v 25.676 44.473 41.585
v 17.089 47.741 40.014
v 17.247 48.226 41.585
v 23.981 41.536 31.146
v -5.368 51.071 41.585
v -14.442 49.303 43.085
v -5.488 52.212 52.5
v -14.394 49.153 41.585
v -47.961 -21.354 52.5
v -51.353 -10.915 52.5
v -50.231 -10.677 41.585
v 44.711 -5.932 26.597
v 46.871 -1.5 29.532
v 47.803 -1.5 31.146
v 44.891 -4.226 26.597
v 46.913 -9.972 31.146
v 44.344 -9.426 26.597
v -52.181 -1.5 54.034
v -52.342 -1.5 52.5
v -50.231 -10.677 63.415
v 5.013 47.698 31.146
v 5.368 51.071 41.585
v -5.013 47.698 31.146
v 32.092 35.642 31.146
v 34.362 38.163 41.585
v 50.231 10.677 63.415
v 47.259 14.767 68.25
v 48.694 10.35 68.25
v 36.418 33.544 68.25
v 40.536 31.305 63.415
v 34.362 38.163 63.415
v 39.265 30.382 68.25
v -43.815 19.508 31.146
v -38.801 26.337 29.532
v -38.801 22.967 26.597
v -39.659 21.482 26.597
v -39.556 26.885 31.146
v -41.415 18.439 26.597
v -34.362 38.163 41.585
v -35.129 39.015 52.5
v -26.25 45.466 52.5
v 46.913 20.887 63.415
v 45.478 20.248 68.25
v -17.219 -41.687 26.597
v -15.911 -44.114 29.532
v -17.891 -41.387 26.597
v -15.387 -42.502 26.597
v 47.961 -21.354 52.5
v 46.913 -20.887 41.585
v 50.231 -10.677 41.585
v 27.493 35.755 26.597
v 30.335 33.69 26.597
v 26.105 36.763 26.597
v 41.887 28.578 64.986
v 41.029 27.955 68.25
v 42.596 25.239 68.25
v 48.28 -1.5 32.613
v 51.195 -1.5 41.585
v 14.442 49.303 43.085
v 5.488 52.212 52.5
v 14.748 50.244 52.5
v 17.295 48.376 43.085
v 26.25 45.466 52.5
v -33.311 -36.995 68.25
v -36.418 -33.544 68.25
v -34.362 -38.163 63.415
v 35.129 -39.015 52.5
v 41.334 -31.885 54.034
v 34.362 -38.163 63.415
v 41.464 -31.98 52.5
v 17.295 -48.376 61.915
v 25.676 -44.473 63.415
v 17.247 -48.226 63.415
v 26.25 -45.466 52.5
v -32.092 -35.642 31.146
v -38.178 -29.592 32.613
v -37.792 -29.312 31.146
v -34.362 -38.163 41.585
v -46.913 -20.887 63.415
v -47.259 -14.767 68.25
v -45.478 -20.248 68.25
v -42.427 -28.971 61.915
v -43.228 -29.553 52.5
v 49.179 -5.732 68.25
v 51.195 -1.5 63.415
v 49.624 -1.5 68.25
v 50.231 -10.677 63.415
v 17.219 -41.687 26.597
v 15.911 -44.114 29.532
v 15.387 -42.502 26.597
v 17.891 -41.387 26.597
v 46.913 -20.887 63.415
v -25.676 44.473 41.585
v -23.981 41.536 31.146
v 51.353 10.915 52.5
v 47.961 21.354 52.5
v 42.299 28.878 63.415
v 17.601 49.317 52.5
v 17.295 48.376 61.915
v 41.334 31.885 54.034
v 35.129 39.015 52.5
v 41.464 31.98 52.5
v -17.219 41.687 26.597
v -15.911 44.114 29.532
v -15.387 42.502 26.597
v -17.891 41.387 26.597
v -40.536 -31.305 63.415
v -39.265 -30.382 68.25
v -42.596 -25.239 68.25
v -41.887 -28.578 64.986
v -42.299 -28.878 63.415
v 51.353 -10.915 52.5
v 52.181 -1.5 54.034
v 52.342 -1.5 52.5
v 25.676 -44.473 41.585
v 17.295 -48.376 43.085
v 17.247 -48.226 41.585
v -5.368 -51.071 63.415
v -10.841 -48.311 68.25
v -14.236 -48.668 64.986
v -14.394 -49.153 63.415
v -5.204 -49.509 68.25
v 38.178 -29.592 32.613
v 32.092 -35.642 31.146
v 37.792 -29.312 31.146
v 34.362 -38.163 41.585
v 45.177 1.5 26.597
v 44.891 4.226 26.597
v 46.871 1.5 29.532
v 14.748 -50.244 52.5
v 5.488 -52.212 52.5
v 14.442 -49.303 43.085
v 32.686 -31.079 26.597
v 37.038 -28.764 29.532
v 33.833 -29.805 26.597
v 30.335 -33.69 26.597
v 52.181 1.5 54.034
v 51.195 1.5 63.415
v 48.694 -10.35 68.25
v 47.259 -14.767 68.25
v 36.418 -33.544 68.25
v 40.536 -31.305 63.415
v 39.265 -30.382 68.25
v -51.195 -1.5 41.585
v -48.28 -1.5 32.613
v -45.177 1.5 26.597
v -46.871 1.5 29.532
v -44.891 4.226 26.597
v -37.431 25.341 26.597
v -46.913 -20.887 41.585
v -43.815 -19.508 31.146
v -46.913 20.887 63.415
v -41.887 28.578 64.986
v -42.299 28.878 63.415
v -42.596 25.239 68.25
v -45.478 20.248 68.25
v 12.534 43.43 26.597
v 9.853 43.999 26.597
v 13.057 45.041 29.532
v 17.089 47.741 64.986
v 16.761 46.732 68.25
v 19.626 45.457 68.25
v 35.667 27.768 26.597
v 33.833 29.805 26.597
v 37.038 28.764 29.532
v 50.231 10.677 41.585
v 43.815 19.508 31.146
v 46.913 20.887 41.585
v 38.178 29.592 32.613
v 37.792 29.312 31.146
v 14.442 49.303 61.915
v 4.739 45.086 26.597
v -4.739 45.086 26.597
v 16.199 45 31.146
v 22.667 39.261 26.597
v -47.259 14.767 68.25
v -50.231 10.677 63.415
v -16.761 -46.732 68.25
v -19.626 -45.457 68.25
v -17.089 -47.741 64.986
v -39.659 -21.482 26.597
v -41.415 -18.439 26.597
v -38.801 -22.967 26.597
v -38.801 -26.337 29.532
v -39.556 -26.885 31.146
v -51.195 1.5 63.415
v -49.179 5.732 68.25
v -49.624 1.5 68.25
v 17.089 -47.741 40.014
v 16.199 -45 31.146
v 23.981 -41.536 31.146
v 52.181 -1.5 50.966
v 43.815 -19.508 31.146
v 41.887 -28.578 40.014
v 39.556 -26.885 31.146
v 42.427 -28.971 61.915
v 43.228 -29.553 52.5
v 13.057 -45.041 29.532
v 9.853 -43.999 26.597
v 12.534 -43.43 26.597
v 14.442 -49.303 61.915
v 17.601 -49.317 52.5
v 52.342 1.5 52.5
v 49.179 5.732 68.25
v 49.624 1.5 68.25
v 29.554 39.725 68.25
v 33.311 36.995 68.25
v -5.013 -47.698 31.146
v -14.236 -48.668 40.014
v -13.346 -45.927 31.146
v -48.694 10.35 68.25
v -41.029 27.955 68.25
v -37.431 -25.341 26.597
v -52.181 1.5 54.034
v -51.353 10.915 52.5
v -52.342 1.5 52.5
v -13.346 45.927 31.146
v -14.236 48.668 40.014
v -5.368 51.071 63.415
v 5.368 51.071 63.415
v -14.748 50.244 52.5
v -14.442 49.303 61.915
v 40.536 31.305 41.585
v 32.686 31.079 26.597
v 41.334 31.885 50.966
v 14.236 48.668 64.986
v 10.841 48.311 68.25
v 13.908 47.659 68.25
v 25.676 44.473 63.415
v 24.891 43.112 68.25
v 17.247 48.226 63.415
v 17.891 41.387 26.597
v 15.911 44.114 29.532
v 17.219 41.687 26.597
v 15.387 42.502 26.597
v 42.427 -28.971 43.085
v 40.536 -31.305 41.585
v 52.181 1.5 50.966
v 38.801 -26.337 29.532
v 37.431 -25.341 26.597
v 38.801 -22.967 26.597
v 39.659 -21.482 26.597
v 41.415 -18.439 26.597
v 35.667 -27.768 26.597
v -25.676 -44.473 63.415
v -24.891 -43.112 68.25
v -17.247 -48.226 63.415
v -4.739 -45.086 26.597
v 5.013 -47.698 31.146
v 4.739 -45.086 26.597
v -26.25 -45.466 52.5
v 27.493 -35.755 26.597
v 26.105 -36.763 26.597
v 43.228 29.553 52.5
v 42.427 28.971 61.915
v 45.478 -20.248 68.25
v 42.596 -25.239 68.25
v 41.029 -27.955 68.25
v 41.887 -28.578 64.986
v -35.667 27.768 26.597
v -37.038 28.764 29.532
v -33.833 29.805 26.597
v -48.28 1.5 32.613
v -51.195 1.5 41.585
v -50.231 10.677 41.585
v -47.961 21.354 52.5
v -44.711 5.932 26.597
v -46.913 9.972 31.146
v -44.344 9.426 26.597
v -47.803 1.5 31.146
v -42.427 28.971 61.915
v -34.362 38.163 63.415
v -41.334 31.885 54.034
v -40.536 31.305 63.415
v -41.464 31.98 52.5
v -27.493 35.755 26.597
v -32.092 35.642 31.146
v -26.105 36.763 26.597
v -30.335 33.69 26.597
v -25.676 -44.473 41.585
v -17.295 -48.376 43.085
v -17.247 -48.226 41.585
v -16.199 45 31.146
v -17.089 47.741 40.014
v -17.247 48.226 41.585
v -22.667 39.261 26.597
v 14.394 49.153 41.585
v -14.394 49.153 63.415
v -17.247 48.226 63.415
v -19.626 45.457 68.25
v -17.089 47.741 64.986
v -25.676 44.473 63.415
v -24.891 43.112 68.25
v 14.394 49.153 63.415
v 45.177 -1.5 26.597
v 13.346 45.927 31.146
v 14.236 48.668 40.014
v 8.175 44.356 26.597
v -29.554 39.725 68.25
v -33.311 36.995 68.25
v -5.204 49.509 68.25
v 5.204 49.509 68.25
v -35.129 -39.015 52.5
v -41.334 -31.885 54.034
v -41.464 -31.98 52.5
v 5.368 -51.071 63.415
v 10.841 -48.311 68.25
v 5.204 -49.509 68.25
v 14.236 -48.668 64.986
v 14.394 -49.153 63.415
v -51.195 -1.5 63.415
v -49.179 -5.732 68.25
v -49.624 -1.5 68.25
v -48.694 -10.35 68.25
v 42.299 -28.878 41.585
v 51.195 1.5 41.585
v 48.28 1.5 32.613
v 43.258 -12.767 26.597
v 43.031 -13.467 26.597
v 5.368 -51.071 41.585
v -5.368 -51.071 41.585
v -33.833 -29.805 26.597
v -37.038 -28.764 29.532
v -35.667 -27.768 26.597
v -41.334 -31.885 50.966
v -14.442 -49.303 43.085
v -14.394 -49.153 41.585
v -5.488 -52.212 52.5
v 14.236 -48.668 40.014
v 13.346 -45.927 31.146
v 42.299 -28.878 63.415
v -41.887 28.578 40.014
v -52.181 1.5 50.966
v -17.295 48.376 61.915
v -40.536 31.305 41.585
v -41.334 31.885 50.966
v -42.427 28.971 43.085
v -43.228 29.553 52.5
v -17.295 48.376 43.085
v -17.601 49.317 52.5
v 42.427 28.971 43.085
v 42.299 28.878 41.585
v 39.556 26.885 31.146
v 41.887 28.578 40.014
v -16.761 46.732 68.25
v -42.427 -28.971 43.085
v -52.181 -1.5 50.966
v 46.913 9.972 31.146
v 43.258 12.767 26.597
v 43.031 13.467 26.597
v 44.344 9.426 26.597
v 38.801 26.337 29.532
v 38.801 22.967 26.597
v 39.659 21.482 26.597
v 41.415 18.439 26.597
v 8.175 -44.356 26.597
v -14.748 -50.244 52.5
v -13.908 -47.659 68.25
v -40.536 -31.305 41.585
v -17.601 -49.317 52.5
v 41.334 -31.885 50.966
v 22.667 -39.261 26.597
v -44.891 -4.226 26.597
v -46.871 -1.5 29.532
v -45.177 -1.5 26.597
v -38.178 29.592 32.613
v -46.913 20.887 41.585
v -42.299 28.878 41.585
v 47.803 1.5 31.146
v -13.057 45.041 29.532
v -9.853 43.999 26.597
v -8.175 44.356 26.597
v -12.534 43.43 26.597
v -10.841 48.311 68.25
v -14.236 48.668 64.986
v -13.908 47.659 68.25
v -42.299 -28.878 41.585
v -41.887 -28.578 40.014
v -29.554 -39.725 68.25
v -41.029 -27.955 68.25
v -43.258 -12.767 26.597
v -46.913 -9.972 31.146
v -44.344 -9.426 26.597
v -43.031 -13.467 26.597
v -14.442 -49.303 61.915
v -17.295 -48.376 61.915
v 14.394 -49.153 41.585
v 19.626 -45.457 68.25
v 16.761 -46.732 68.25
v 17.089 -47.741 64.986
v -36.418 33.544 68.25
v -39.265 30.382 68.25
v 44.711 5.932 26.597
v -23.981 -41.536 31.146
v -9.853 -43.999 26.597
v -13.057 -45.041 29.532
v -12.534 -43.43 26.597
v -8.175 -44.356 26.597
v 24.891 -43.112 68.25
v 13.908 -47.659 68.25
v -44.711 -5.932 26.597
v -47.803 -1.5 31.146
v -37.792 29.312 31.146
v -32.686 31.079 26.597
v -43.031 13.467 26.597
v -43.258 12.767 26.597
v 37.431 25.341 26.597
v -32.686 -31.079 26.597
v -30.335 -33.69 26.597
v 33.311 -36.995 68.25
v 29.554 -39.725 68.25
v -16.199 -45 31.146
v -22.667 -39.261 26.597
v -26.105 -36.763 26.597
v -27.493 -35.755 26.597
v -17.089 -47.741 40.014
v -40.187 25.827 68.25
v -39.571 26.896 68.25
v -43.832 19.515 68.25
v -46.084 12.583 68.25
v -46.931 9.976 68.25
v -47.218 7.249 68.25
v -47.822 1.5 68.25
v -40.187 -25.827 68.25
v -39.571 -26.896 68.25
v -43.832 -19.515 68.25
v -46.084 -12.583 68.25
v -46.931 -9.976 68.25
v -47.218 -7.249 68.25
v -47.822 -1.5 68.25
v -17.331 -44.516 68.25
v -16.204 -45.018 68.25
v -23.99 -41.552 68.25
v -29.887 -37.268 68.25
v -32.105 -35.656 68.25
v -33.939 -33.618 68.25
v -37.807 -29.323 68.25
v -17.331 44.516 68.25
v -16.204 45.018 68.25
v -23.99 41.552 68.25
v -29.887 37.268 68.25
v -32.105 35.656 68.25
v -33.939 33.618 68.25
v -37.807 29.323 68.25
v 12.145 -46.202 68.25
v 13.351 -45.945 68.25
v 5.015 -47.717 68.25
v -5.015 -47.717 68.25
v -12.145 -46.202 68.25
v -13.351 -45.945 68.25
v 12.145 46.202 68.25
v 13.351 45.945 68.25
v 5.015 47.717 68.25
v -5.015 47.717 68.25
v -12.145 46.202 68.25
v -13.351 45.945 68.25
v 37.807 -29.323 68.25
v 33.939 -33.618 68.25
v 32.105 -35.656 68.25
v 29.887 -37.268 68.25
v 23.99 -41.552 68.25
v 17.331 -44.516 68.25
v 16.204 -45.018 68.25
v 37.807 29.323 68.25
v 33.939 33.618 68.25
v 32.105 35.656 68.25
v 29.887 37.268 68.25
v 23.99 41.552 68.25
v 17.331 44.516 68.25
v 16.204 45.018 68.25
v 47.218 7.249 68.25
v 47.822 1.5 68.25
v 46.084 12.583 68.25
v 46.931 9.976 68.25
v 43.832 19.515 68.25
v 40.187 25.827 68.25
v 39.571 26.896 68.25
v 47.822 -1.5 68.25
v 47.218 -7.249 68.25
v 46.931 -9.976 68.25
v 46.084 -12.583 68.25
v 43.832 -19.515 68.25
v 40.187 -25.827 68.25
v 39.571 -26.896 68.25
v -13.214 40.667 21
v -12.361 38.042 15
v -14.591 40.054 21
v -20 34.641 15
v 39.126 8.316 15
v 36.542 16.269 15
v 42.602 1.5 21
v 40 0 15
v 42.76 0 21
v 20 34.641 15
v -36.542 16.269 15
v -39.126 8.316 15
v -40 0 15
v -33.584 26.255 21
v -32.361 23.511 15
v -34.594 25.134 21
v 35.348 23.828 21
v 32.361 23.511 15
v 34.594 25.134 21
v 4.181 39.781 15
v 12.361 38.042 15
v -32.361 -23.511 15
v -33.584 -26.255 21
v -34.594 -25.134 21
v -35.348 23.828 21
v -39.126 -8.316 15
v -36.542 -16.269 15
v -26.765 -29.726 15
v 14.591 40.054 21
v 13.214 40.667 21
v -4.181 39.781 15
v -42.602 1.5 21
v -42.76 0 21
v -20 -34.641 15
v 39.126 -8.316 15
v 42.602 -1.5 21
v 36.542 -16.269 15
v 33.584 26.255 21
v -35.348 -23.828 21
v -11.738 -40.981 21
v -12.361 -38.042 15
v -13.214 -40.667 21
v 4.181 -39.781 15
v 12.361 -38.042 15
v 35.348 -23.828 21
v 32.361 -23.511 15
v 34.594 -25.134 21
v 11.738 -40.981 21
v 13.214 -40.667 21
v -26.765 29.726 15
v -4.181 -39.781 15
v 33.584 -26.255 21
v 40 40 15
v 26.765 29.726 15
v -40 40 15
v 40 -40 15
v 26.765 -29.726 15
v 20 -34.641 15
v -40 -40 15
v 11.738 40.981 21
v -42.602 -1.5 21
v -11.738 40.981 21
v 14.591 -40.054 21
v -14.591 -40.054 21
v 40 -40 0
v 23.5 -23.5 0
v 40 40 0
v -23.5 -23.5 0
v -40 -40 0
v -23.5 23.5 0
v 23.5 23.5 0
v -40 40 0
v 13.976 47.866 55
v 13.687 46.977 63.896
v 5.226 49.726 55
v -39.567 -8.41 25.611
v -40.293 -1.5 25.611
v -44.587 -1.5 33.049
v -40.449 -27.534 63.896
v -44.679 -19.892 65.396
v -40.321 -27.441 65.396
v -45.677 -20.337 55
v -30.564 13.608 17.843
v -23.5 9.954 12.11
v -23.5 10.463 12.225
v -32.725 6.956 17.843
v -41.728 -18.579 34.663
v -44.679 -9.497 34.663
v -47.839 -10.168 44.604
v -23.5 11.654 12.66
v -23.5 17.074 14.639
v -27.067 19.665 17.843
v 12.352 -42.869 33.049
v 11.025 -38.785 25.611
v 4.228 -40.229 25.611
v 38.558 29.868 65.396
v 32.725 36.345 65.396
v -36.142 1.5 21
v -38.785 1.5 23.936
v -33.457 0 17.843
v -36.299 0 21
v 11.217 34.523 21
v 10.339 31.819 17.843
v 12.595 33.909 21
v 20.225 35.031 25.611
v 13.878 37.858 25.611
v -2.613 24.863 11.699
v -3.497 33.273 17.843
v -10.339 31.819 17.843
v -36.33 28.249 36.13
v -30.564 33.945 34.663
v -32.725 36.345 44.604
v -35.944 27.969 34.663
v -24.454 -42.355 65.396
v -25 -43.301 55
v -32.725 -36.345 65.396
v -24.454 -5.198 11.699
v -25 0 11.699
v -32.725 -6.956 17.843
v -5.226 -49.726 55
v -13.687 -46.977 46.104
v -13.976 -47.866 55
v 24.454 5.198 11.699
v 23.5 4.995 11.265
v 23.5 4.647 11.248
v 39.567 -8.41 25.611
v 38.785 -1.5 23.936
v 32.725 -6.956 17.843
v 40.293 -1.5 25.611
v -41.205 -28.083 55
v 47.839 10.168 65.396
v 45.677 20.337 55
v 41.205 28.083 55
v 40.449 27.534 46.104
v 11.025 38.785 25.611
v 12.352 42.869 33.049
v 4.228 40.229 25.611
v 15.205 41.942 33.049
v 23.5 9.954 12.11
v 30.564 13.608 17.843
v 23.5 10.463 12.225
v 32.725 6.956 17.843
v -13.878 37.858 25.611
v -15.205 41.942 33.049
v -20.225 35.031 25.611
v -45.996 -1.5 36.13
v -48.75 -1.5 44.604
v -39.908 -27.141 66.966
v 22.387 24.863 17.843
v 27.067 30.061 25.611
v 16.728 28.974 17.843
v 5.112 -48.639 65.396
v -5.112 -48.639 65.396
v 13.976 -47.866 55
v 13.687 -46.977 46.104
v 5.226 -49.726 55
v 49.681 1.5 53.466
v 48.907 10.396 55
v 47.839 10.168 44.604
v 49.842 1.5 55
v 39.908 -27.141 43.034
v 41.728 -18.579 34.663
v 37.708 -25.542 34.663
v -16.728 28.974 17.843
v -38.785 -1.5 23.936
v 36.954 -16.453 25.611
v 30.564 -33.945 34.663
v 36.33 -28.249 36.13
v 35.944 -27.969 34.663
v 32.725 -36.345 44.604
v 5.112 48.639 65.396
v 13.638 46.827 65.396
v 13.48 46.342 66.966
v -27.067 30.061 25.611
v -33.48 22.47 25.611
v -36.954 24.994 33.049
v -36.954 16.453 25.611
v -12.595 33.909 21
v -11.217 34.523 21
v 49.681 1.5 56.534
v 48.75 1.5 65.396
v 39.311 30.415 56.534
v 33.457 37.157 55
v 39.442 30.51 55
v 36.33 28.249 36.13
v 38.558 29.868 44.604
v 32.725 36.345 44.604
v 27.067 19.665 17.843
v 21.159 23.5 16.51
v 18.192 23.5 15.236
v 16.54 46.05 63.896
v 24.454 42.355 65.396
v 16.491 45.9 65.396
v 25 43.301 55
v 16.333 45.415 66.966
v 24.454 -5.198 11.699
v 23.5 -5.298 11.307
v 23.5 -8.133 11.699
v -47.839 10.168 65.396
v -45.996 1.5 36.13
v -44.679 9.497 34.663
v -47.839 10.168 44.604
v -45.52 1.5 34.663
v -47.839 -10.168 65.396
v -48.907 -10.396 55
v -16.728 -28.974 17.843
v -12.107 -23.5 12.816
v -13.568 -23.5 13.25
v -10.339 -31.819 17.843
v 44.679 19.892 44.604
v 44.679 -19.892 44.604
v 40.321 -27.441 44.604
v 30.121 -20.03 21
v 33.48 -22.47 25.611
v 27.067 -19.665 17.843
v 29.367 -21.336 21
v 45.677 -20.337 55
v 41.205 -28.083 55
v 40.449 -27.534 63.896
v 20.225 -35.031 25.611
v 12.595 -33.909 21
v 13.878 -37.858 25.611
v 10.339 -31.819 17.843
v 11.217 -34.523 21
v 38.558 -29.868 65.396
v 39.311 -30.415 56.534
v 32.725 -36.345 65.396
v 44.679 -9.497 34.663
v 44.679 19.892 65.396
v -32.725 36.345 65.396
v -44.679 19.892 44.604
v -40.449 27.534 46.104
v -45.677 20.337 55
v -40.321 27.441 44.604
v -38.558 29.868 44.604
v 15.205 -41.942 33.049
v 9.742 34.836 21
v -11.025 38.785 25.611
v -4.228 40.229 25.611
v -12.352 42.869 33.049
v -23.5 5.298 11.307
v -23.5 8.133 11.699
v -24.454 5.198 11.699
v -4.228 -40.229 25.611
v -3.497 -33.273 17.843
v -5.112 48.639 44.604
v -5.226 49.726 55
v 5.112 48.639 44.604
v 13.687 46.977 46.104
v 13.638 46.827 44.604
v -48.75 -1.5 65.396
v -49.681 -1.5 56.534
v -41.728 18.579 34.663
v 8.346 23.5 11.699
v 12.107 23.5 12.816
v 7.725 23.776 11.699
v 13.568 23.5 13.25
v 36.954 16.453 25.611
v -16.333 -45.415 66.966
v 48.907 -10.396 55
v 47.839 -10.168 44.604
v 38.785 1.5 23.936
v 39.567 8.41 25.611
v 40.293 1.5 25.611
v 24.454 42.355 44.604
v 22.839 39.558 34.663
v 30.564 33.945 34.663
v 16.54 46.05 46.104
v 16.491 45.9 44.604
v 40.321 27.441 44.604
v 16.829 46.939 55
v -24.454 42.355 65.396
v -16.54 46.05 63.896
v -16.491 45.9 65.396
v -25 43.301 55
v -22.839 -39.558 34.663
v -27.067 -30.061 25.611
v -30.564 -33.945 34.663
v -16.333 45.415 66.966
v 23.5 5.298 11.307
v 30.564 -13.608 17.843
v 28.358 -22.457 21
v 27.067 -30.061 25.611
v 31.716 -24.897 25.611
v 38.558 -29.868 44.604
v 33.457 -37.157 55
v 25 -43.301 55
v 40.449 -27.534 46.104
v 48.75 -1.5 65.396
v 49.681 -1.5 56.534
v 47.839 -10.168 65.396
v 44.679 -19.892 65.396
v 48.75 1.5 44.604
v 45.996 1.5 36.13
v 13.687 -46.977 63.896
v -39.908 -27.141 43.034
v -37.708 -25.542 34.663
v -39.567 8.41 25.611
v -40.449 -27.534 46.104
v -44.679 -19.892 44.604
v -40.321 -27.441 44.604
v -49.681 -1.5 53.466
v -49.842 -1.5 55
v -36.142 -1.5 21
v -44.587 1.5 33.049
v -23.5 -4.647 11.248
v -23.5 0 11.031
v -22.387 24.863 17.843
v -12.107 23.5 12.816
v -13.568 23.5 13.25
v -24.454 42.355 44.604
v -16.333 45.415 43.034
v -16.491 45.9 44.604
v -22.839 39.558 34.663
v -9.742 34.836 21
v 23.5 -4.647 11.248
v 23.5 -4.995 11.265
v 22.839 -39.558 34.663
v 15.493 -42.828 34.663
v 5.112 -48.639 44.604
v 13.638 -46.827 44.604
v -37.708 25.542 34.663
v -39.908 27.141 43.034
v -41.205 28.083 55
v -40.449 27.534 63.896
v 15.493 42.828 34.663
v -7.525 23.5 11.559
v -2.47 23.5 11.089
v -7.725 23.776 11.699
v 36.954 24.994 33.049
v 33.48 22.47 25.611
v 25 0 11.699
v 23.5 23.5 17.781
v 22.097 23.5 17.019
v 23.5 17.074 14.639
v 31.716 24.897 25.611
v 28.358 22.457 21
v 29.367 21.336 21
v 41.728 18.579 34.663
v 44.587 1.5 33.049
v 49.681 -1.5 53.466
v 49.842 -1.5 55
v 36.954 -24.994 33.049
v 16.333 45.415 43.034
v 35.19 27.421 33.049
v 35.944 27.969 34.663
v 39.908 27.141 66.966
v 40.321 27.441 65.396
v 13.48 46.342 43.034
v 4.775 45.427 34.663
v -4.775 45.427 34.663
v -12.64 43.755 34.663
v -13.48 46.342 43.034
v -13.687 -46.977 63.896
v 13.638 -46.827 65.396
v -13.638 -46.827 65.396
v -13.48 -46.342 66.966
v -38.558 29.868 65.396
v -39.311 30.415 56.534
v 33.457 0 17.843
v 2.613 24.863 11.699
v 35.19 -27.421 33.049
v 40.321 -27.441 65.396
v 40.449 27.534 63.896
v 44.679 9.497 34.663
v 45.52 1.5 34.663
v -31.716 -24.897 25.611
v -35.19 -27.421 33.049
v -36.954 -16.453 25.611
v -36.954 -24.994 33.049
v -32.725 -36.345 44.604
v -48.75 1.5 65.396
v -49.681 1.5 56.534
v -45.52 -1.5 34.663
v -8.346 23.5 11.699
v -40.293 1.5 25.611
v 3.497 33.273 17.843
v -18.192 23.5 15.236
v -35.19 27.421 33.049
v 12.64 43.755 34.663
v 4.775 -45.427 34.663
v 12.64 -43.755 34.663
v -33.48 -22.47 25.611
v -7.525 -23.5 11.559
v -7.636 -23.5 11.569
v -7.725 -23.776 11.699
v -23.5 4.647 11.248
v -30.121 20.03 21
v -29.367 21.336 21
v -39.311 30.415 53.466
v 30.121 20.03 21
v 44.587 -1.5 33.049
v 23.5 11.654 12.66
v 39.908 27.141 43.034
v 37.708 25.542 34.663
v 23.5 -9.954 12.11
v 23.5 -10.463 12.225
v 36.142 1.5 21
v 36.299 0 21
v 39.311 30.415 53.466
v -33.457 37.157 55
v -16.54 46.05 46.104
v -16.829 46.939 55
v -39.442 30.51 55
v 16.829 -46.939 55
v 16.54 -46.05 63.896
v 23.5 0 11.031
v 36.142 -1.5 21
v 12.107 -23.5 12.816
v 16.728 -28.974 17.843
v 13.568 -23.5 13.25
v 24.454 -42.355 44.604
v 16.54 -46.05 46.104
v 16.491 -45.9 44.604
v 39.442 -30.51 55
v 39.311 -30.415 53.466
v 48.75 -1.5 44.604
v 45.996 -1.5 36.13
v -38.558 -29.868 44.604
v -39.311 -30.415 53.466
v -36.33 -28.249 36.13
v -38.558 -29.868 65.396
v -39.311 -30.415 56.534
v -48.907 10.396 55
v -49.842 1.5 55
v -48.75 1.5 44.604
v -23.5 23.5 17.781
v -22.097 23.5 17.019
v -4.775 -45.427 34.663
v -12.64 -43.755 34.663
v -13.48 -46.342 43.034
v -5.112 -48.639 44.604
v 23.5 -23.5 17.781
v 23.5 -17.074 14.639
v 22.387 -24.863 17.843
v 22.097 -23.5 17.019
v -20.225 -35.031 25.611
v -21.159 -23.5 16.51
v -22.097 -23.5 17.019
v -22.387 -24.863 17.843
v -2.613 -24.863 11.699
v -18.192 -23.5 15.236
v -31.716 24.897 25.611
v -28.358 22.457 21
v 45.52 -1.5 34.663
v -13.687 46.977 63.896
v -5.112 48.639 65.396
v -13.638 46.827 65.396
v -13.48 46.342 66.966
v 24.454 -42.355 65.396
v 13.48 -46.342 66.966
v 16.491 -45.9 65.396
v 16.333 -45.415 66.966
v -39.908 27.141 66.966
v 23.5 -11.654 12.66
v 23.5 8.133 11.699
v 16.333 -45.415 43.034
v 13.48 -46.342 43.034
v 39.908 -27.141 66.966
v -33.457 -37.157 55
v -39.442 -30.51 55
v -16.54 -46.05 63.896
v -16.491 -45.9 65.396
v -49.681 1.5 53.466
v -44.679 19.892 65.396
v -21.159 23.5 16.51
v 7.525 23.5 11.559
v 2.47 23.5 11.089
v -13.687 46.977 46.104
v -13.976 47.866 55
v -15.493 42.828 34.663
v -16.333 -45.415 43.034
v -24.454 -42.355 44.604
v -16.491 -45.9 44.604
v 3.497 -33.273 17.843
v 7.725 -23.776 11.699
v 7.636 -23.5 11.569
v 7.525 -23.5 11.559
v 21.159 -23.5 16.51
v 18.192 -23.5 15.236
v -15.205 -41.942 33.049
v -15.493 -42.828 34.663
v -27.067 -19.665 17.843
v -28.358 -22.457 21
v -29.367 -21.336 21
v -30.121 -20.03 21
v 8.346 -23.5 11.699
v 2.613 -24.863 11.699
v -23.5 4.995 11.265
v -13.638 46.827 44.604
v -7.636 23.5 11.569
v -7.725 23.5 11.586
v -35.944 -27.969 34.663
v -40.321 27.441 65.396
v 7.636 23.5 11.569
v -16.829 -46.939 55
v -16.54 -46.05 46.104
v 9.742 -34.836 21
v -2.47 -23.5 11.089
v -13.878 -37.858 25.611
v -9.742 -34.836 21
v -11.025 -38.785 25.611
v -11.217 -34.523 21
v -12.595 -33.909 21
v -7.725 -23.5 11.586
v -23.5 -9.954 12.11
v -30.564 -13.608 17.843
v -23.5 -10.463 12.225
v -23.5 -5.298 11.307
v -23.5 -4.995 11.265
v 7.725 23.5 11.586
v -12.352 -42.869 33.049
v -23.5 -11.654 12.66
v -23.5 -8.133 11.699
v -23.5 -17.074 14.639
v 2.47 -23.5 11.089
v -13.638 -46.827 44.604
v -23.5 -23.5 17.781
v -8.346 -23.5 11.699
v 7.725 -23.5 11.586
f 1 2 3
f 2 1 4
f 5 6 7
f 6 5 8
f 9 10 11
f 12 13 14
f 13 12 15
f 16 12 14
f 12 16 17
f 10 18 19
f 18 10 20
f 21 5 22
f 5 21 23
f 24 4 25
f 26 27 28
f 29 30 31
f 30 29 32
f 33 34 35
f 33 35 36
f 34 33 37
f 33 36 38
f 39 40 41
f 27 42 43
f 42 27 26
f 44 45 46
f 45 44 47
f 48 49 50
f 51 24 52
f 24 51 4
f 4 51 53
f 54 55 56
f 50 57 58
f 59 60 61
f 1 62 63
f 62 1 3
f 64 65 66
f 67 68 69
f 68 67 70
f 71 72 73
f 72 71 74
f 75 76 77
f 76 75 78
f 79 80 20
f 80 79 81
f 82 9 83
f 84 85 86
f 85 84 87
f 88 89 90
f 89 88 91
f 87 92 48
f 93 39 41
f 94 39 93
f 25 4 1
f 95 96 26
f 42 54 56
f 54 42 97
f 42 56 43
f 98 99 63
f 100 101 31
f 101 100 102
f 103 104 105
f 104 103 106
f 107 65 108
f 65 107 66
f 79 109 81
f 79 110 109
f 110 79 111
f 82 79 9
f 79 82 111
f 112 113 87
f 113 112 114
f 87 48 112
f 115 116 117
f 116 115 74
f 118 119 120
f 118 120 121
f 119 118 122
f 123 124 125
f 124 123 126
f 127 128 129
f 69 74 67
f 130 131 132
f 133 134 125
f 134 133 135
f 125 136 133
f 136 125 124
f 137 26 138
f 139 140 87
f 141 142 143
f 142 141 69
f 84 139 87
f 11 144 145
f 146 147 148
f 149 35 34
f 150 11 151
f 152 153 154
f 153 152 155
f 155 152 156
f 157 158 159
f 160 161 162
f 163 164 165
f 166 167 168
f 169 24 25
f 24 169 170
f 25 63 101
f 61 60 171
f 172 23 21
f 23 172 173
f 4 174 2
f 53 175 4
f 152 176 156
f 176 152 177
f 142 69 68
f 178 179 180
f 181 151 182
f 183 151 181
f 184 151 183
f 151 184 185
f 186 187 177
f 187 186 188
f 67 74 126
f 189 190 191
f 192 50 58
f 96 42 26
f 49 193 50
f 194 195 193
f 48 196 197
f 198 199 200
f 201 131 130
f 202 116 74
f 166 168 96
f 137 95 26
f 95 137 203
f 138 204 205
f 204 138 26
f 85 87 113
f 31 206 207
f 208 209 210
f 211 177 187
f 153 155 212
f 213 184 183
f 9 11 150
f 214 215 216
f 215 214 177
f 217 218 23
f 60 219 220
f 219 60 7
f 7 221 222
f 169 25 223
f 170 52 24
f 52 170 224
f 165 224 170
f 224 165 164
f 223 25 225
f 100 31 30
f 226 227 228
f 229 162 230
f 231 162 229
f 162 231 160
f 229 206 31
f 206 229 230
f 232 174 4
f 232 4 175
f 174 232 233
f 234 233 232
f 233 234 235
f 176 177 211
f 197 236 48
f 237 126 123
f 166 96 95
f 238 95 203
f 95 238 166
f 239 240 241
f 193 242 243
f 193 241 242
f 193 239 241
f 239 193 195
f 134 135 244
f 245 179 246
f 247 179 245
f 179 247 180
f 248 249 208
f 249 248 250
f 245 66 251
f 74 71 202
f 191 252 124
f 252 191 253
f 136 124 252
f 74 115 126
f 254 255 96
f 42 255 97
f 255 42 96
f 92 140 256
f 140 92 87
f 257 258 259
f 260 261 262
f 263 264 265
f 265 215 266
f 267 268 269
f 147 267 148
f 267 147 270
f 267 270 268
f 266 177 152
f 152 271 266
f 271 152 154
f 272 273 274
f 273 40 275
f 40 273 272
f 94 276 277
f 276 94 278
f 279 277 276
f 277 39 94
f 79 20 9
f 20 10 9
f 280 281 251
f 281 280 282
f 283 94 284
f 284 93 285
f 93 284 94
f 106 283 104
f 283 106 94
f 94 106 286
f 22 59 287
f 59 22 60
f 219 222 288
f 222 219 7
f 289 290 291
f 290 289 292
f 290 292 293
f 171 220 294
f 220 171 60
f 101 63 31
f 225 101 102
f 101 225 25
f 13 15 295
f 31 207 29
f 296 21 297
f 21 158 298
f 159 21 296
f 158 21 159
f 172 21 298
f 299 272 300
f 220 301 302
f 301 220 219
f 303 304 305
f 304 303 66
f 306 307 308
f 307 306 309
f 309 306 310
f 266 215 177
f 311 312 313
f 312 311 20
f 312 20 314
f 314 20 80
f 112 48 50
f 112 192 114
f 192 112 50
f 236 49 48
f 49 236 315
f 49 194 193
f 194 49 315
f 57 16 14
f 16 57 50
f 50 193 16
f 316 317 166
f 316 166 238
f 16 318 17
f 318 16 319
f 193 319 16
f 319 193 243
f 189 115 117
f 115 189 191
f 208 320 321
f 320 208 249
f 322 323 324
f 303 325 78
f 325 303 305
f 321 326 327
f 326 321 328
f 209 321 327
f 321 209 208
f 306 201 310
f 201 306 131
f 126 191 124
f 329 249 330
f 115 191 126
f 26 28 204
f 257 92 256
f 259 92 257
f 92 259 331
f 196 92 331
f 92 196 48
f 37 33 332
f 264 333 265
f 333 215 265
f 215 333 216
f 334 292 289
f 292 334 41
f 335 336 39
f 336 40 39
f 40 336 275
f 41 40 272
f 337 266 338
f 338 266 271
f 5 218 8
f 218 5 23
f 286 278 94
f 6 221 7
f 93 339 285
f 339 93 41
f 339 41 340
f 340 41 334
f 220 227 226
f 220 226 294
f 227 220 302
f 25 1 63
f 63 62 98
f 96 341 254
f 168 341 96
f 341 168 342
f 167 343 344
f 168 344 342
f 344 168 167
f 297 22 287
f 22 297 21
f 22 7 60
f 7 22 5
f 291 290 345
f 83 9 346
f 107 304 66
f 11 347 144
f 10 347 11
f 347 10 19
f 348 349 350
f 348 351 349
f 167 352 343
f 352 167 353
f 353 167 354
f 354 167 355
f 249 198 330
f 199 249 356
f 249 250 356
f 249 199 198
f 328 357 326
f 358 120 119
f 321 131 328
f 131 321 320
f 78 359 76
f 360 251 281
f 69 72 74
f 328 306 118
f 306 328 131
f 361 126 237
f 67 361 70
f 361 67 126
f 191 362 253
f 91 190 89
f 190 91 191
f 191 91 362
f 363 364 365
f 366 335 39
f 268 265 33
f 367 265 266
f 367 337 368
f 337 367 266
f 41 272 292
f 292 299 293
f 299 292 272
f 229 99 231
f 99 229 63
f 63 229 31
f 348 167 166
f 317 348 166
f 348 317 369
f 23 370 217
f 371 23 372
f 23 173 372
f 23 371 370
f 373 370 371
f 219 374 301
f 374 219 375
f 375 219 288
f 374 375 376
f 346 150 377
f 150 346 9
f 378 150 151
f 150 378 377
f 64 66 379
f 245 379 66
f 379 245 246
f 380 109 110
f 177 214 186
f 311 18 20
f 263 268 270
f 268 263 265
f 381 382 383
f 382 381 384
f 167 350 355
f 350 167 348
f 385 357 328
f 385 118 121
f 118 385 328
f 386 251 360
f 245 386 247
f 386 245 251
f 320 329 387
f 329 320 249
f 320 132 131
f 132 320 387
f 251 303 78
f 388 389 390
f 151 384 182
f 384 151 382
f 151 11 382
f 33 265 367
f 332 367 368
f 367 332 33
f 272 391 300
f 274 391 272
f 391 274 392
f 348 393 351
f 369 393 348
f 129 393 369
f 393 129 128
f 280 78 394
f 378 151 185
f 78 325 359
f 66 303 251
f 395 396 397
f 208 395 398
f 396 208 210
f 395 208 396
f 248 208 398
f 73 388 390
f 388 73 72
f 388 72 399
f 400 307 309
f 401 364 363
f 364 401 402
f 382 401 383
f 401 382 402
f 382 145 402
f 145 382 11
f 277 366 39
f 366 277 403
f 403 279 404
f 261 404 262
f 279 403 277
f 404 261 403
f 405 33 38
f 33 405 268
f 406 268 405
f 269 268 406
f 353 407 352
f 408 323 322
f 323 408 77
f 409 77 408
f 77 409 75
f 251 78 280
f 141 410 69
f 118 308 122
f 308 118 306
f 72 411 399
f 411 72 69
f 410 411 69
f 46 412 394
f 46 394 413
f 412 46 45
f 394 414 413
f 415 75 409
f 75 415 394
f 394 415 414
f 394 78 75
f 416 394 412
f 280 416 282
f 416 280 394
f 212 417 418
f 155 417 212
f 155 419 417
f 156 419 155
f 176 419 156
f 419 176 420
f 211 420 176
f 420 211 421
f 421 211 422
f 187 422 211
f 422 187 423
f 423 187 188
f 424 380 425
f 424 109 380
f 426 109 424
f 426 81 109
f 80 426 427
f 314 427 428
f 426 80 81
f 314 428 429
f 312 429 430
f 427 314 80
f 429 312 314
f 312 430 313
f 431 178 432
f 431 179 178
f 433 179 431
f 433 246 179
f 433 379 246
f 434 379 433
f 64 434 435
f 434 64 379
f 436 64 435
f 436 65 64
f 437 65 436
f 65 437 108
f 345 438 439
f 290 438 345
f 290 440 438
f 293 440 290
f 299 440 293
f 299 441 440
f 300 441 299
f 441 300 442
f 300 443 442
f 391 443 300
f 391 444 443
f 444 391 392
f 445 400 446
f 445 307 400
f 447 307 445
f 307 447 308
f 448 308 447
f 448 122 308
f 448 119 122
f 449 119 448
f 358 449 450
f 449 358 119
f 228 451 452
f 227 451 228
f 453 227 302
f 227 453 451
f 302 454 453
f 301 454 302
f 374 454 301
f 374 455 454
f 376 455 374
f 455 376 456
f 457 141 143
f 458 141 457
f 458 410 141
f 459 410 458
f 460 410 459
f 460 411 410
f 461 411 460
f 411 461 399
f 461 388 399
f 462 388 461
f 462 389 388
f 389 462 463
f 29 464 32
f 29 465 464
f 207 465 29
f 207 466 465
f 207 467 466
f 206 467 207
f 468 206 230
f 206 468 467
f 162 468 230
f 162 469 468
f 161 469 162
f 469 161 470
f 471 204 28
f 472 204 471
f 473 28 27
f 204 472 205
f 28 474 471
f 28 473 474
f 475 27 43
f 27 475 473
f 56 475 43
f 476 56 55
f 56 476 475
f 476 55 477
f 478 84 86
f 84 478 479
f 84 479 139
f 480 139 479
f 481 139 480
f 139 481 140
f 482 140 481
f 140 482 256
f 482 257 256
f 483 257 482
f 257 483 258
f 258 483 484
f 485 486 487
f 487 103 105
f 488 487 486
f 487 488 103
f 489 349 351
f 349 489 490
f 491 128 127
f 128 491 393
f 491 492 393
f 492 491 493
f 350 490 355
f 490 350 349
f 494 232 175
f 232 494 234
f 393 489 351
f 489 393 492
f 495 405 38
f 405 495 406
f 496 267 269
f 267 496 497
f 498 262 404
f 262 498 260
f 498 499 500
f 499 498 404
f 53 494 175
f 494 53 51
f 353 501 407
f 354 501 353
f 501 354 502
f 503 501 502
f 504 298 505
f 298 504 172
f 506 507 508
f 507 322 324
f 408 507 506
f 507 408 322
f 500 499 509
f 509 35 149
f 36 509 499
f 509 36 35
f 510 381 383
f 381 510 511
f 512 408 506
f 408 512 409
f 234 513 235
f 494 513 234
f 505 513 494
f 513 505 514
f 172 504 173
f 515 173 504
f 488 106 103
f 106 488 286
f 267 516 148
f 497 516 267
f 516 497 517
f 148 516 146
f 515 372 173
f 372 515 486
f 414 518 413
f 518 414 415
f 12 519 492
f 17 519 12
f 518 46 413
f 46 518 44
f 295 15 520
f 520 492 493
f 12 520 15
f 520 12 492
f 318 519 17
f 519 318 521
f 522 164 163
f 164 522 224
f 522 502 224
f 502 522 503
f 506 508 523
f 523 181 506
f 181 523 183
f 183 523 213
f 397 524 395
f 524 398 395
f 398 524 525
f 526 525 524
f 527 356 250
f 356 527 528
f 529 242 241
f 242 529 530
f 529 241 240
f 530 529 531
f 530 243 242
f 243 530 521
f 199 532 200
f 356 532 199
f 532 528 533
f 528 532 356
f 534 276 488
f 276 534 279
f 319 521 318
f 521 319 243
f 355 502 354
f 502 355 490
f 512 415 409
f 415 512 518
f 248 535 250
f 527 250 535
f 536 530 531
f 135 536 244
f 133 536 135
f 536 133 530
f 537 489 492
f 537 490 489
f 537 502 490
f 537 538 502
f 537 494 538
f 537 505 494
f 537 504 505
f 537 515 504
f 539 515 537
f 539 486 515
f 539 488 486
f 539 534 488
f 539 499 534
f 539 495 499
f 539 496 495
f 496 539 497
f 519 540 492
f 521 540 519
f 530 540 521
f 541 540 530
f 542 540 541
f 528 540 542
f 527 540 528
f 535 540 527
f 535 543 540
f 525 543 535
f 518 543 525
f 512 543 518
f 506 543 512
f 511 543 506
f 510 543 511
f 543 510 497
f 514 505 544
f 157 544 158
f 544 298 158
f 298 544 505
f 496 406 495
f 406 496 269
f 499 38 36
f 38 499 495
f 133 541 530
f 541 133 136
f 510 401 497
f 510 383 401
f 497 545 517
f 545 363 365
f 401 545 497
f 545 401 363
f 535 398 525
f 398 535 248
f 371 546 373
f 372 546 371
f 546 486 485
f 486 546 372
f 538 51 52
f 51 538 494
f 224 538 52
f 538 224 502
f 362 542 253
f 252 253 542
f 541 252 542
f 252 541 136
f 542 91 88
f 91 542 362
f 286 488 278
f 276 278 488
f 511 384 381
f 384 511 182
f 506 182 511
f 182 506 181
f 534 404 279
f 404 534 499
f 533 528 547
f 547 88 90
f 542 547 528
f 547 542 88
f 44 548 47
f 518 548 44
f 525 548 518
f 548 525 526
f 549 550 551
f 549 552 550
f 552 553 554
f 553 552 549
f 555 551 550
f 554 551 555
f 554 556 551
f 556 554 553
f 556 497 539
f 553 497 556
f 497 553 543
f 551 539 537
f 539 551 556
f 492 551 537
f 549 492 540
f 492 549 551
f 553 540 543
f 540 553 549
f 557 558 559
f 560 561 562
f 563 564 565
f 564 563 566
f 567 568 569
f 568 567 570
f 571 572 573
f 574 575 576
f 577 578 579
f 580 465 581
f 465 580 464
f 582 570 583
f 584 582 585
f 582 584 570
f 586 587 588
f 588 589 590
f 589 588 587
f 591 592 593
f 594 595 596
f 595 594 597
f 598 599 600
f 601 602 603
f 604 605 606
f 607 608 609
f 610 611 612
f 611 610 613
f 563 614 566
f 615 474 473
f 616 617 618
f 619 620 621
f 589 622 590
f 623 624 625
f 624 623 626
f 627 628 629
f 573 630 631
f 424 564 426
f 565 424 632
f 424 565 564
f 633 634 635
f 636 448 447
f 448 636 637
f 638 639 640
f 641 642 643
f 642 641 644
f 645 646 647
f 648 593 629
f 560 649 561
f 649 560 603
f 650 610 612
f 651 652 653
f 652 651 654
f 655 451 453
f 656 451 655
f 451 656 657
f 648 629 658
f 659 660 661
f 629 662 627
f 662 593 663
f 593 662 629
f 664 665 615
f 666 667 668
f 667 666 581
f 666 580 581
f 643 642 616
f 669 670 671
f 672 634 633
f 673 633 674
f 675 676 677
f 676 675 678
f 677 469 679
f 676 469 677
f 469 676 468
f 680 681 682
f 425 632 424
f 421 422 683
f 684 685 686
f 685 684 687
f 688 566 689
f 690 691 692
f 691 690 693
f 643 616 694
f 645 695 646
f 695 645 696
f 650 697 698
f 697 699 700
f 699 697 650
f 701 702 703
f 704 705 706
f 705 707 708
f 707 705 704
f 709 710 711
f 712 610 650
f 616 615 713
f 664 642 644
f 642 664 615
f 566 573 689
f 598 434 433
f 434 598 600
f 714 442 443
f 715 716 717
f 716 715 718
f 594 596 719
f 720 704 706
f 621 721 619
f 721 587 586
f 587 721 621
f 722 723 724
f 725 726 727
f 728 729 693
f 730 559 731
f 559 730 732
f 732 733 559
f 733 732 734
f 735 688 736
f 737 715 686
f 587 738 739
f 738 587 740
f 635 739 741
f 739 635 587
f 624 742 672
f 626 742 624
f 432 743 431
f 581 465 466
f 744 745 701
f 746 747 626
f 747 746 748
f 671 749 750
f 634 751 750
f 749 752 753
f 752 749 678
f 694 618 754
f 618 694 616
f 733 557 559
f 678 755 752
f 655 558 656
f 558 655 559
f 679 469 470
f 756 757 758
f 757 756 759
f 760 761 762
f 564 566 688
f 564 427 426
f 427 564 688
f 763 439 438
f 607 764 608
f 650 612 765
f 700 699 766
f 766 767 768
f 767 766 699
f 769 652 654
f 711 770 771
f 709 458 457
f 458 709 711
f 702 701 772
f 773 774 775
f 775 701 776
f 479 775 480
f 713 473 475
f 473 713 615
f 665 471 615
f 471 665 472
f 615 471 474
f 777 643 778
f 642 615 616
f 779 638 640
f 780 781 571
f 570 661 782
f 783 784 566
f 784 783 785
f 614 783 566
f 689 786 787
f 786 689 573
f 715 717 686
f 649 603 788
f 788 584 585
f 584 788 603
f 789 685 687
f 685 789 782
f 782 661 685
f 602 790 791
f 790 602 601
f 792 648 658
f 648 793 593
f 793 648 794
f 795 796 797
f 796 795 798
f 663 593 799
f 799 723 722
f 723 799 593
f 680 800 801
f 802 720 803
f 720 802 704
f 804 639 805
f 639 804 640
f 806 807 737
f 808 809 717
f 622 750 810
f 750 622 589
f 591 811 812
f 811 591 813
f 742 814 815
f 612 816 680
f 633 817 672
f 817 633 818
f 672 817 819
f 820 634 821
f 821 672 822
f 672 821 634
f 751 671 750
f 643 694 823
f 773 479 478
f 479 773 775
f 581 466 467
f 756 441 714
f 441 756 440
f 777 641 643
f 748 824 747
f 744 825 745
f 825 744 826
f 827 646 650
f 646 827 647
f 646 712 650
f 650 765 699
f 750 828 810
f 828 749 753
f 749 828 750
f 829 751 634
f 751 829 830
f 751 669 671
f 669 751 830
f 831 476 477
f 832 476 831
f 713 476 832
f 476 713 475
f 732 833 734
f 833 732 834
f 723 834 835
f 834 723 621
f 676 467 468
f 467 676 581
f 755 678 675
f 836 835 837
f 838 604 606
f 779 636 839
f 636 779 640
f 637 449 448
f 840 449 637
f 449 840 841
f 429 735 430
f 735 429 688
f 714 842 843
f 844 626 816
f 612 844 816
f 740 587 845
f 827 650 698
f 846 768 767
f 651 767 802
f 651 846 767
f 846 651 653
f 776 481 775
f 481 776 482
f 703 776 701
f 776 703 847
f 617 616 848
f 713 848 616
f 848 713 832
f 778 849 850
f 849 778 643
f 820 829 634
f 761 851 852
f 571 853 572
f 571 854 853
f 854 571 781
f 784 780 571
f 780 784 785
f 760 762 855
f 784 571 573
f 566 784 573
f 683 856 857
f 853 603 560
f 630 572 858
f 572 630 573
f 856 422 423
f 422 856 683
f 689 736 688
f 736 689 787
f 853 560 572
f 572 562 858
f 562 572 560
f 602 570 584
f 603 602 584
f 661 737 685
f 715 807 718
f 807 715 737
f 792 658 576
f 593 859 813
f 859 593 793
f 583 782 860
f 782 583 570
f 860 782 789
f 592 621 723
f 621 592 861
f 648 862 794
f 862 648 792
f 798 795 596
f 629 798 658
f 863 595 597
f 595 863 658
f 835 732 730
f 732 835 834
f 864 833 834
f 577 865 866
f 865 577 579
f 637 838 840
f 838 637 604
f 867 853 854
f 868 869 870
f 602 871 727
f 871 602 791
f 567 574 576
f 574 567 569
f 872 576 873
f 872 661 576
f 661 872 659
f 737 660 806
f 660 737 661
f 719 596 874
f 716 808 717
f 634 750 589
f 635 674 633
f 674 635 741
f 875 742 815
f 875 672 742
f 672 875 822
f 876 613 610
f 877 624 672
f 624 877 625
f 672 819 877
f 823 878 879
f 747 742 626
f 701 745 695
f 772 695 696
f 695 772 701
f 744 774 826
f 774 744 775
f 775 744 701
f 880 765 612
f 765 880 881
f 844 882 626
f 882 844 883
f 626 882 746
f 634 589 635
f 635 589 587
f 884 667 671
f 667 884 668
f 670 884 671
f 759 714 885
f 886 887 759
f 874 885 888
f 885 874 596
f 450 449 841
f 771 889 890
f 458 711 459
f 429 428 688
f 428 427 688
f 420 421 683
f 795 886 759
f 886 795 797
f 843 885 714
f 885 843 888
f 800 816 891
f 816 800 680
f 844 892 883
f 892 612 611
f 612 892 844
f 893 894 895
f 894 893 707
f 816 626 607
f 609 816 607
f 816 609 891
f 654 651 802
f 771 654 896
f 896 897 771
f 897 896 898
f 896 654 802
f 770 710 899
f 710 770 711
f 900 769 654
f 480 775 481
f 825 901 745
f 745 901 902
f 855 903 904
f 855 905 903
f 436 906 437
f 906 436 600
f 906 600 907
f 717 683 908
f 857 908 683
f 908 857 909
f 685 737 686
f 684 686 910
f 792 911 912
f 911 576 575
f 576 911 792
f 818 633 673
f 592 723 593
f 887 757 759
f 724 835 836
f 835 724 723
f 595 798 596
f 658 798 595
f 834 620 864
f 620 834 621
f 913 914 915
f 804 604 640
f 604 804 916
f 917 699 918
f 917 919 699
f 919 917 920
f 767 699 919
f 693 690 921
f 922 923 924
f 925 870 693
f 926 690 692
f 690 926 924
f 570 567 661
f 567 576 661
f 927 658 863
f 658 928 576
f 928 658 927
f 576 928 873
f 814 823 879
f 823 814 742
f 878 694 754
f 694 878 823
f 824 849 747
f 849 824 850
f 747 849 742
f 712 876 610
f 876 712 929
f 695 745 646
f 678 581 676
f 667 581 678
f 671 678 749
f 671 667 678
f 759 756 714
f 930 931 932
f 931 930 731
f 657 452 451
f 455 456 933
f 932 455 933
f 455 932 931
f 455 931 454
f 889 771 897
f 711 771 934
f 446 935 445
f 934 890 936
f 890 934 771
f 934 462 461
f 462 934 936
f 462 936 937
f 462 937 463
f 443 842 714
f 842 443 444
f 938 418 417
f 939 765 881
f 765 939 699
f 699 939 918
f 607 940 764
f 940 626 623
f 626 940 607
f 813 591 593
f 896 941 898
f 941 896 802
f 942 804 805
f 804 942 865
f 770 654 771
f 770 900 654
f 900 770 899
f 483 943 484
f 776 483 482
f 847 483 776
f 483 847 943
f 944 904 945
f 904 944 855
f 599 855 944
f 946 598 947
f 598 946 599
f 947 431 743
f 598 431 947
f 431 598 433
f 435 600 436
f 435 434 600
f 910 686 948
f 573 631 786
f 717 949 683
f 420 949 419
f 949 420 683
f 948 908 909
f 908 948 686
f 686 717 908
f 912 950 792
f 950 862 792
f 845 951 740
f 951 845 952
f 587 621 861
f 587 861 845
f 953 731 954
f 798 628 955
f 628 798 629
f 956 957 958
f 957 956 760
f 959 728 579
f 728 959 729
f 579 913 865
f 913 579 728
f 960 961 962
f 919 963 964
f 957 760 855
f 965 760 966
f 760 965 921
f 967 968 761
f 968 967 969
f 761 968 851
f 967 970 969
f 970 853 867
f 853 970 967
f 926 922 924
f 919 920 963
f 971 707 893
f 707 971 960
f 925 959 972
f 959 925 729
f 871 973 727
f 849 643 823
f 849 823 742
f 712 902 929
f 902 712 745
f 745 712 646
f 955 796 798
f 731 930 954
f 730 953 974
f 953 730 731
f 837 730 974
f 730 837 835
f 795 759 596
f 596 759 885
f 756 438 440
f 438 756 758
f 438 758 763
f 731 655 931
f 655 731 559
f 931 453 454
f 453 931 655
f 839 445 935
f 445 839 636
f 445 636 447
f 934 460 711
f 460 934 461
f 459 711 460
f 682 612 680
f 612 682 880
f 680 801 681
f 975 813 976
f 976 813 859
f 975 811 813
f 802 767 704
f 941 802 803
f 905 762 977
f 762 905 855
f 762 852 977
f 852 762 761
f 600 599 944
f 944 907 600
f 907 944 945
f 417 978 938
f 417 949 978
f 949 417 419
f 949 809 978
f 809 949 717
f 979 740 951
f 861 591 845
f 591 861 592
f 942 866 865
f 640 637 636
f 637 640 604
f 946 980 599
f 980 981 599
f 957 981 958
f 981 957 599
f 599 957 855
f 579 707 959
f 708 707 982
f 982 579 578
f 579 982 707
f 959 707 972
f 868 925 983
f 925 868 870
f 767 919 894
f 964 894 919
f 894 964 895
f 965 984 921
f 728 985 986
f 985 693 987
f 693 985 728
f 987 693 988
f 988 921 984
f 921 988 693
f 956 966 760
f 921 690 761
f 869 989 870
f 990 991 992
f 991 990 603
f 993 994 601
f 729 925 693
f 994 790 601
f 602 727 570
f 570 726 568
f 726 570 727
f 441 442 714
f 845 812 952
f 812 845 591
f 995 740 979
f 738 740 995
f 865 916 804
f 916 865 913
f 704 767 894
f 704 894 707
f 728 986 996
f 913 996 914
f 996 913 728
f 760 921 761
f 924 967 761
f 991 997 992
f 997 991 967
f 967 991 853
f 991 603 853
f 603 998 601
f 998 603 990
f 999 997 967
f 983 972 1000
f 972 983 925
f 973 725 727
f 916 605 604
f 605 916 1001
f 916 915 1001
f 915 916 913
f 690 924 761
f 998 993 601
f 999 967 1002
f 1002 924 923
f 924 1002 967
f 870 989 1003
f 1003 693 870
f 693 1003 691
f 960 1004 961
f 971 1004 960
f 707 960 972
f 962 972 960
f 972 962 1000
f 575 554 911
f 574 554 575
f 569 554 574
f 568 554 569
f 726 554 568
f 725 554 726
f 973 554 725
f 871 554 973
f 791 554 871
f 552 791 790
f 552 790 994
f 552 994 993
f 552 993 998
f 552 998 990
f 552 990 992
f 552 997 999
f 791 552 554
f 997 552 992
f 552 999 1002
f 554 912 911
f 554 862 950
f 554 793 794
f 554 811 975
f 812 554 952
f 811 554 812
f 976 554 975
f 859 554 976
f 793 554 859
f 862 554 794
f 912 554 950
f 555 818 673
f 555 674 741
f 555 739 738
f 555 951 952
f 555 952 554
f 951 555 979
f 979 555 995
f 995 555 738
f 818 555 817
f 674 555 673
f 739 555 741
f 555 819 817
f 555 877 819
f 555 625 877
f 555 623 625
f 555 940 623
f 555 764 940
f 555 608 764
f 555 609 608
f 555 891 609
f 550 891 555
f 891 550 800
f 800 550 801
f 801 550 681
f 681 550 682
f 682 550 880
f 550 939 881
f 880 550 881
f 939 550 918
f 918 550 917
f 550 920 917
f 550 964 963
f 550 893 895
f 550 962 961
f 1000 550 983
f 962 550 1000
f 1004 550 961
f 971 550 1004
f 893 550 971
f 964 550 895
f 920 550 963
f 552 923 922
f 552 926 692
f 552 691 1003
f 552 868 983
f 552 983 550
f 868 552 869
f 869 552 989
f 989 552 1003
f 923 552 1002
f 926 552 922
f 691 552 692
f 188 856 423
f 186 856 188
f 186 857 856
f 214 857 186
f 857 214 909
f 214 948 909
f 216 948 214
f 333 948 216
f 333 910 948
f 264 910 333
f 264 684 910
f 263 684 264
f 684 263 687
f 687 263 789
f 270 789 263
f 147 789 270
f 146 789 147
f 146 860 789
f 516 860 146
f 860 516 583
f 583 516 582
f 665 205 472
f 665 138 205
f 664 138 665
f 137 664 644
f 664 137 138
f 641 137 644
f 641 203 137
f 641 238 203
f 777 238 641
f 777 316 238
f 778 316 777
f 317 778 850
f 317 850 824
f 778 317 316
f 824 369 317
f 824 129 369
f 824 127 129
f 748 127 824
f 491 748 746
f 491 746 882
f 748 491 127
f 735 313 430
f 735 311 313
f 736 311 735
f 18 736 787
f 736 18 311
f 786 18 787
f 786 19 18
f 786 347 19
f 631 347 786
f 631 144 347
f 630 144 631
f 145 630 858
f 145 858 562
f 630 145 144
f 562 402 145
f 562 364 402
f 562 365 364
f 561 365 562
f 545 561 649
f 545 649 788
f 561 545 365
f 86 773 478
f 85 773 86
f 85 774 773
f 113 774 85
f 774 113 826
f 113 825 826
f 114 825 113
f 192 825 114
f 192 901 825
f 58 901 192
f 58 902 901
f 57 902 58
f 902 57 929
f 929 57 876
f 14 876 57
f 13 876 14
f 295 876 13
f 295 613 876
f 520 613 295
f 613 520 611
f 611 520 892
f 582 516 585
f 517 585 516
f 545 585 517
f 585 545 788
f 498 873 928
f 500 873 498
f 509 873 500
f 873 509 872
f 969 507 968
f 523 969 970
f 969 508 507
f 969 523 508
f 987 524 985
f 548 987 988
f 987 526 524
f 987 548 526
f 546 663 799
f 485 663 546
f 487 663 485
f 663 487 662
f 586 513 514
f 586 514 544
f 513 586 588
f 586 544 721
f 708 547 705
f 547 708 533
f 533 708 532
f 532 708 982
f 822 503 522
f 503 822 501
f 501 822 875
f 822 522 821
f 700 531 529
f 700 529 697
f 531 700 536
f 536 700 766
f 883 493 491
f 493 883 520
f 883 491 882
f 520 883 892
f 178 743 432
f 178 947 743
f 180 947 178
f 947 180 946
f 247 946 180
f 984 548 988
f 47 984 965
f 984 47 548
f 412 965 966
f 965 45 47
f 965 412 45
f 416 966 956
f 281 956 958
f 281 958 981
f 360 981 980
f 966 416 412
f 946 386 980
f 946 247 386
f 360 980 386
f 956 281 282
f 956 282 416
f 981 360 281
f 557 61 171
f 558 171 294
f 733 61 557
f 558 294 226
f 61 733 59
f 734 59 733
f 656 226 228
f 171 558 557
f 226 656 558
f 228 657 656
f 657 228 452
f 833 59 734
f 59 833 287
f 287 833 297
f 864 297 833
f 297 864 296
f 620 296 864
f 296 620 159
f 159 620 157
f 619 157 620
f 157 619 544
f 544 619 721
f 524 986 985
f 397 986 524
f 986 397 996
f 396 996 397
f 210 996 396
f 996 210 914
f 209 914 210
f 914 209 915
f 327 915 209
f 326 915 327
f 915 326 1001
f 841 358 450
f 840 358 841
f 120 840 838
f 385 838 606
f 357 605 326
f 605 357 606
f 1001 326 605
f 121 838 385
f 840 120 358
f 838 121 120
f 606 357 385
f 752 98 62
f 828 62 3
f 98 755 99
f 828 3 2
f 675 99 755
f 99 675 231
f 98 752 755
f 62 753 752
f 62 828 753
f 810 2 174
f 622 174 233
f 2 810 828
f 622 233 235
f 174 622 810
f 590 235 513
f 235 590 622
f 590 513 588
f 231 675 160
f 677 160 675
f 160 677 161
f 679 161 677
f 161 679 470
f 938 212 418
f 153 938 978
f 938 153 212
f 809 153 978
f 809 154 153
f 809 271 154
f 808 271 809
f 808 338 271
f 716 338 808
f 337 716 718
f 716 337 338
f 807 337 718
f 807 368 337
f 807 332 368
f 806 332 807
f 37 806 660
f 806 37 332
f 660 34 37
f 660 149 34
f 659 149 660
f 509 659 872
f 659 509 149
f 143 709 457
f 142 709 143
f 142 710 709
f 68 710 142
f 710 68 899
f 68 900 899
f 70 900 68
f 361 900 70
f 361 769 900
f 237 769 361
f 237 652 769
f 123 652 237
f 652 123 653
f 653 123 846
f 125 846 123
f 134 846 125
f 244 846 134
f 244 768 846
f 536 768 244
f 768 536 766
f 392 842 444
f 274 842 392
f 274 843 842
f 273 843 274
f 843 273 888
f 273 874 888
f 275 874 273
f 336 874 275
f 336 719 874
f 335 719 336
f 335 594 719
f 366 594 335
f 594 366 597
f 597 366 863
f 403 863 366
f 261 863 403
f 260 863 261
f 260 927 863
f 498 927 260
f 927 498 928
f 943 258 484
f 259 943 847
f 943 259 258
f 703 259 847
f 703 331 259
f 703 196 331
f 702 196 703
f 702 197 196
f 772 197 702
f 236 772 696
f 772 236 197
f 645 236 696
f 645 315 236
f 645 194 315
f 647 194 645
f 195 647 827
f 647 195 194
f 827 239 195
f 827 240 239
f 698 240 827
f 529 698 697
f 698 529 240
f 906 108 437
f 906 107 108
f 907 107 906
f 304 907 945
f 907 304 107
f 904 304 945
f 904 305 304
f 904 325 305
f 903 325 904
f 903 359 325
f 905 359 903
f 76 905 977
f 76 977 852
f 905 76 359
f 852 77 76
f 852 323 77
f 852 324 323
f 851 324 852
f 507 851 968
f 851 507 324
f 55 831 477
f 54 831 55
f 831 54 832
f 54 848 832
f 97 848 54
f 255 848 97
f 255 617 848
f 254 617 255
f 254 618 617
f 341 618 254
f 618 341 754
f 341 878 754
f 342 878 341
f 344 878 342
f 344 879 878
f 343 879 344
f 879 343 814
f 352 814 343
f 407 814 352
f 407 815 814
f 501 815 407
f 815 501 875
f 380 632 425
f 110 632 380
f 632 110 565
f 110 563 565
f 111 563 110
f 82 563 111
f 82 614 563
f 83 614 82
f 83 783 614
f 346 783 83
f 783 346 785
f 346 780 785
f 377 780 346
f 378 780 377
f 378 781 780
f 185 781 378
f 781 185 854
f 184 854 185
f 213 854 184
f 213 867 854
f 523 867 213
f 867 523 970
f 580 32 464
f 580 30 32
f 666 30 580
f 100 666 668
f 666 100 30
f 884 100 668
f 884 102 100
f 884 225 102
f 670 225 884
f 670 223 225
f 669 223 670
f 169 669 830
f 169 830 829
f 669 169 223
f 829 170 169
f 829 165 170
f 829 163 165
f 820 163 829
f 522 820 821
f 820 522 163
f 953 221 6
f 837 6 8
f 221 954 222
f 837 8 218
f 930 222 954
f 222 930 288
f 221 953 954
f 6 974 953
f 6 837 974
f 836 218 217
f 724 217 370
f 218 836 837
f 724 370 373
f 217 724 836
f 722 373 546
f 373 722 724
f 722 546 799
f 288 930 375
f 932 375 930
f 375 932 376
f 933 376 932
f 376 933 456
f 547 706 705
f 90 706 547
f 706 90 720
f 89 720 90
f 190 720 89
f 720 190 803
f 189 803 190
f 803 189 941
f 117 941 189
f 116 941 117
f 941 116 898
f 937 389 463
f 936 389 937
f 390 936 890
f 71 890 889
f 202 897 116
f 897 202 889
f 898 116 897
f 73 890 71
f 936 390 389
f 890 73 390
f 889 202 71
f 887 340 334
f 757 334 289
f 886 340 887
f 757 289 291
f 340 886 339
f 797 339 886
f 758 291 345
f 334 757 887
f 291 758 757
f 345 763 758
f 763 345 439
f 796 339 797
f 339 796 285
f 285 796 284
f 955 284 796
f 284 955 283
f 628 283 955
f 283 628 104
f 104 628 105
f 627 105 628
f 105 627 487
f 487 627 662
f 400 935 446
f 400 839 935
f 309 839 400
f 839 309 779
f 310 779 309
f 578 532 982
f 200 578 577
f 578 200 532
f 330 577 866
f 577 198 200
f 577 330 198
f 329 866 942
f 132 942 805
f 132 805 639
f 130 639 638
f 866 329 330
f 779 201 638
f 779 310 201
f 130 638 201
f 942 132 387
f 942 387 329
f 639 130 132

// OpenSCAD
// Generated by SolidPython 0.4.7 on 2020-04-10 19:30:12


difference(){
	difference() {
		union() {
			translate(v = [0, 0, 15]) {
				linear_extrude(height = 20, scale = 1.2300000000) {
					circle(d = 80);
				}
			}
			scale(v = 1.0500000000) {
				translate(v = [0, 0, 50]) {
					difference() {
						sphere(r = 50);
						translate(v = [0, 0, 65]) {
							cube(center = true, size = 100);
						}
					}
				}
			}
			difference() {
				linear_extrude(height = 15) {
					square(center = true, size = 80);
				}
			}
		}
	}
	/* Holes Below*/
	union(){
		union(){
			translate(v = [0, 0, 55]) {
				sphere(r = 50);
			}
			union(){
				linear_extrude(height = 45) {
					square(center = true, size = 47);
				}
			}
		}
		union() {
			rotate(a = 0, v = [0, 0, 1]) {
				translate(v = [0, 0, 21]) {
					translate(v = [-250.0000000000, 0, 0]) {
						rotate(a = 90, v = [1, 0, 0]) {
							translate(v = [0, 0, -1.5000000000]) {
								linear_extrude(height = 3) {
									square(size = 500);
								}
							}
						}
					}
				}
			}
			rotate(a = 72, v = [0, 0, 1]) {
				translate(v = [0, 0, 21]) {
					translate(v = [-250.0000000000, 0, 0]) {
						rotate(a = 90, v = [1, 0, 0]) {
							translate(v = [0, 0, -1.5000000000]) {
								linear_extrude(height = 3) {
									square(size = 500);
								}
							}
						}
					}
				}
			}
			rotate(a = 144, v = [0, 0, 1]) {
				translate(v = [0, 0, 21]) {
					translate(v = [-250.0000000000, 0, 0]) {
						rotate(a = 90, v = [1, 0, 0]) {
							translate(v = [0, 0, -1.5000000000]) {
								linear_extrude(height = 3) {
									square(size = 500);
								}
							}
						}
					}
				}
			}
			rotate(a = 216, v = [0, 0, 1]) {
				translate(v = [0, 0, 21]) {
					translate(v = [-250.0000000000, 0, 0]) {
						rotate(a = 90, v = [1, 0, 0]) {
							translate(v = [0, 0, -1.5000000000]) {
								linear_extrude(height = 3) {
									square(size = 500);
								}
							}
						}
					}
				}
			}
			rotate(a = 288, v = [0, 0, 1]) {
				translate(v = [0, 0, 21]) {
					translate(v = [-250.0000000000, 0, 0]) {
						rotate(a = 90, v = [1, 0, 0]) {
							translate(v = [0, 0, -1.5000000000]) {
								linear_extrude(height = 3) {
									square(size = 500);
								}
							}
						}
					}
				}
			}
		}
	} /* End Holes */ 
}
/***********************************************
*********      SolidPython code:      **********
************************************************
 
from .lib.grinder_base import GrinderBase
from .lib.dell_connector import DellConnector
from .lib.holder.round_holder import RoundHolder

from solid import *
from solid.utils import *  # Not required, but the utils module is useful





#connector = DellConnector(x_holders=4, y_holders=2)

#scad = connector.rotate_to_print(connector.multiple_dell_holder())
#scad = connector.multiple_dell_holder()



#top = GrinderBase.custom_diameter(90, 17).platform()
#scad_render_to_file(top, "coffee-grinder_base.scad")


base = GrinderBase().platform()
scad_render_to_file(base, "coffee-grinder_base.scad")


round_holder = RoundHolder().completeHolder()
scad_render_to_file(round_holder, "coffee-round-holder.scad")

connector = linear_extrude(height=30)(square(47, center=True)-square(40, center=True))
scad_render_to_file(connector, "coffee-connector.scad")
 
 
************************************************/
